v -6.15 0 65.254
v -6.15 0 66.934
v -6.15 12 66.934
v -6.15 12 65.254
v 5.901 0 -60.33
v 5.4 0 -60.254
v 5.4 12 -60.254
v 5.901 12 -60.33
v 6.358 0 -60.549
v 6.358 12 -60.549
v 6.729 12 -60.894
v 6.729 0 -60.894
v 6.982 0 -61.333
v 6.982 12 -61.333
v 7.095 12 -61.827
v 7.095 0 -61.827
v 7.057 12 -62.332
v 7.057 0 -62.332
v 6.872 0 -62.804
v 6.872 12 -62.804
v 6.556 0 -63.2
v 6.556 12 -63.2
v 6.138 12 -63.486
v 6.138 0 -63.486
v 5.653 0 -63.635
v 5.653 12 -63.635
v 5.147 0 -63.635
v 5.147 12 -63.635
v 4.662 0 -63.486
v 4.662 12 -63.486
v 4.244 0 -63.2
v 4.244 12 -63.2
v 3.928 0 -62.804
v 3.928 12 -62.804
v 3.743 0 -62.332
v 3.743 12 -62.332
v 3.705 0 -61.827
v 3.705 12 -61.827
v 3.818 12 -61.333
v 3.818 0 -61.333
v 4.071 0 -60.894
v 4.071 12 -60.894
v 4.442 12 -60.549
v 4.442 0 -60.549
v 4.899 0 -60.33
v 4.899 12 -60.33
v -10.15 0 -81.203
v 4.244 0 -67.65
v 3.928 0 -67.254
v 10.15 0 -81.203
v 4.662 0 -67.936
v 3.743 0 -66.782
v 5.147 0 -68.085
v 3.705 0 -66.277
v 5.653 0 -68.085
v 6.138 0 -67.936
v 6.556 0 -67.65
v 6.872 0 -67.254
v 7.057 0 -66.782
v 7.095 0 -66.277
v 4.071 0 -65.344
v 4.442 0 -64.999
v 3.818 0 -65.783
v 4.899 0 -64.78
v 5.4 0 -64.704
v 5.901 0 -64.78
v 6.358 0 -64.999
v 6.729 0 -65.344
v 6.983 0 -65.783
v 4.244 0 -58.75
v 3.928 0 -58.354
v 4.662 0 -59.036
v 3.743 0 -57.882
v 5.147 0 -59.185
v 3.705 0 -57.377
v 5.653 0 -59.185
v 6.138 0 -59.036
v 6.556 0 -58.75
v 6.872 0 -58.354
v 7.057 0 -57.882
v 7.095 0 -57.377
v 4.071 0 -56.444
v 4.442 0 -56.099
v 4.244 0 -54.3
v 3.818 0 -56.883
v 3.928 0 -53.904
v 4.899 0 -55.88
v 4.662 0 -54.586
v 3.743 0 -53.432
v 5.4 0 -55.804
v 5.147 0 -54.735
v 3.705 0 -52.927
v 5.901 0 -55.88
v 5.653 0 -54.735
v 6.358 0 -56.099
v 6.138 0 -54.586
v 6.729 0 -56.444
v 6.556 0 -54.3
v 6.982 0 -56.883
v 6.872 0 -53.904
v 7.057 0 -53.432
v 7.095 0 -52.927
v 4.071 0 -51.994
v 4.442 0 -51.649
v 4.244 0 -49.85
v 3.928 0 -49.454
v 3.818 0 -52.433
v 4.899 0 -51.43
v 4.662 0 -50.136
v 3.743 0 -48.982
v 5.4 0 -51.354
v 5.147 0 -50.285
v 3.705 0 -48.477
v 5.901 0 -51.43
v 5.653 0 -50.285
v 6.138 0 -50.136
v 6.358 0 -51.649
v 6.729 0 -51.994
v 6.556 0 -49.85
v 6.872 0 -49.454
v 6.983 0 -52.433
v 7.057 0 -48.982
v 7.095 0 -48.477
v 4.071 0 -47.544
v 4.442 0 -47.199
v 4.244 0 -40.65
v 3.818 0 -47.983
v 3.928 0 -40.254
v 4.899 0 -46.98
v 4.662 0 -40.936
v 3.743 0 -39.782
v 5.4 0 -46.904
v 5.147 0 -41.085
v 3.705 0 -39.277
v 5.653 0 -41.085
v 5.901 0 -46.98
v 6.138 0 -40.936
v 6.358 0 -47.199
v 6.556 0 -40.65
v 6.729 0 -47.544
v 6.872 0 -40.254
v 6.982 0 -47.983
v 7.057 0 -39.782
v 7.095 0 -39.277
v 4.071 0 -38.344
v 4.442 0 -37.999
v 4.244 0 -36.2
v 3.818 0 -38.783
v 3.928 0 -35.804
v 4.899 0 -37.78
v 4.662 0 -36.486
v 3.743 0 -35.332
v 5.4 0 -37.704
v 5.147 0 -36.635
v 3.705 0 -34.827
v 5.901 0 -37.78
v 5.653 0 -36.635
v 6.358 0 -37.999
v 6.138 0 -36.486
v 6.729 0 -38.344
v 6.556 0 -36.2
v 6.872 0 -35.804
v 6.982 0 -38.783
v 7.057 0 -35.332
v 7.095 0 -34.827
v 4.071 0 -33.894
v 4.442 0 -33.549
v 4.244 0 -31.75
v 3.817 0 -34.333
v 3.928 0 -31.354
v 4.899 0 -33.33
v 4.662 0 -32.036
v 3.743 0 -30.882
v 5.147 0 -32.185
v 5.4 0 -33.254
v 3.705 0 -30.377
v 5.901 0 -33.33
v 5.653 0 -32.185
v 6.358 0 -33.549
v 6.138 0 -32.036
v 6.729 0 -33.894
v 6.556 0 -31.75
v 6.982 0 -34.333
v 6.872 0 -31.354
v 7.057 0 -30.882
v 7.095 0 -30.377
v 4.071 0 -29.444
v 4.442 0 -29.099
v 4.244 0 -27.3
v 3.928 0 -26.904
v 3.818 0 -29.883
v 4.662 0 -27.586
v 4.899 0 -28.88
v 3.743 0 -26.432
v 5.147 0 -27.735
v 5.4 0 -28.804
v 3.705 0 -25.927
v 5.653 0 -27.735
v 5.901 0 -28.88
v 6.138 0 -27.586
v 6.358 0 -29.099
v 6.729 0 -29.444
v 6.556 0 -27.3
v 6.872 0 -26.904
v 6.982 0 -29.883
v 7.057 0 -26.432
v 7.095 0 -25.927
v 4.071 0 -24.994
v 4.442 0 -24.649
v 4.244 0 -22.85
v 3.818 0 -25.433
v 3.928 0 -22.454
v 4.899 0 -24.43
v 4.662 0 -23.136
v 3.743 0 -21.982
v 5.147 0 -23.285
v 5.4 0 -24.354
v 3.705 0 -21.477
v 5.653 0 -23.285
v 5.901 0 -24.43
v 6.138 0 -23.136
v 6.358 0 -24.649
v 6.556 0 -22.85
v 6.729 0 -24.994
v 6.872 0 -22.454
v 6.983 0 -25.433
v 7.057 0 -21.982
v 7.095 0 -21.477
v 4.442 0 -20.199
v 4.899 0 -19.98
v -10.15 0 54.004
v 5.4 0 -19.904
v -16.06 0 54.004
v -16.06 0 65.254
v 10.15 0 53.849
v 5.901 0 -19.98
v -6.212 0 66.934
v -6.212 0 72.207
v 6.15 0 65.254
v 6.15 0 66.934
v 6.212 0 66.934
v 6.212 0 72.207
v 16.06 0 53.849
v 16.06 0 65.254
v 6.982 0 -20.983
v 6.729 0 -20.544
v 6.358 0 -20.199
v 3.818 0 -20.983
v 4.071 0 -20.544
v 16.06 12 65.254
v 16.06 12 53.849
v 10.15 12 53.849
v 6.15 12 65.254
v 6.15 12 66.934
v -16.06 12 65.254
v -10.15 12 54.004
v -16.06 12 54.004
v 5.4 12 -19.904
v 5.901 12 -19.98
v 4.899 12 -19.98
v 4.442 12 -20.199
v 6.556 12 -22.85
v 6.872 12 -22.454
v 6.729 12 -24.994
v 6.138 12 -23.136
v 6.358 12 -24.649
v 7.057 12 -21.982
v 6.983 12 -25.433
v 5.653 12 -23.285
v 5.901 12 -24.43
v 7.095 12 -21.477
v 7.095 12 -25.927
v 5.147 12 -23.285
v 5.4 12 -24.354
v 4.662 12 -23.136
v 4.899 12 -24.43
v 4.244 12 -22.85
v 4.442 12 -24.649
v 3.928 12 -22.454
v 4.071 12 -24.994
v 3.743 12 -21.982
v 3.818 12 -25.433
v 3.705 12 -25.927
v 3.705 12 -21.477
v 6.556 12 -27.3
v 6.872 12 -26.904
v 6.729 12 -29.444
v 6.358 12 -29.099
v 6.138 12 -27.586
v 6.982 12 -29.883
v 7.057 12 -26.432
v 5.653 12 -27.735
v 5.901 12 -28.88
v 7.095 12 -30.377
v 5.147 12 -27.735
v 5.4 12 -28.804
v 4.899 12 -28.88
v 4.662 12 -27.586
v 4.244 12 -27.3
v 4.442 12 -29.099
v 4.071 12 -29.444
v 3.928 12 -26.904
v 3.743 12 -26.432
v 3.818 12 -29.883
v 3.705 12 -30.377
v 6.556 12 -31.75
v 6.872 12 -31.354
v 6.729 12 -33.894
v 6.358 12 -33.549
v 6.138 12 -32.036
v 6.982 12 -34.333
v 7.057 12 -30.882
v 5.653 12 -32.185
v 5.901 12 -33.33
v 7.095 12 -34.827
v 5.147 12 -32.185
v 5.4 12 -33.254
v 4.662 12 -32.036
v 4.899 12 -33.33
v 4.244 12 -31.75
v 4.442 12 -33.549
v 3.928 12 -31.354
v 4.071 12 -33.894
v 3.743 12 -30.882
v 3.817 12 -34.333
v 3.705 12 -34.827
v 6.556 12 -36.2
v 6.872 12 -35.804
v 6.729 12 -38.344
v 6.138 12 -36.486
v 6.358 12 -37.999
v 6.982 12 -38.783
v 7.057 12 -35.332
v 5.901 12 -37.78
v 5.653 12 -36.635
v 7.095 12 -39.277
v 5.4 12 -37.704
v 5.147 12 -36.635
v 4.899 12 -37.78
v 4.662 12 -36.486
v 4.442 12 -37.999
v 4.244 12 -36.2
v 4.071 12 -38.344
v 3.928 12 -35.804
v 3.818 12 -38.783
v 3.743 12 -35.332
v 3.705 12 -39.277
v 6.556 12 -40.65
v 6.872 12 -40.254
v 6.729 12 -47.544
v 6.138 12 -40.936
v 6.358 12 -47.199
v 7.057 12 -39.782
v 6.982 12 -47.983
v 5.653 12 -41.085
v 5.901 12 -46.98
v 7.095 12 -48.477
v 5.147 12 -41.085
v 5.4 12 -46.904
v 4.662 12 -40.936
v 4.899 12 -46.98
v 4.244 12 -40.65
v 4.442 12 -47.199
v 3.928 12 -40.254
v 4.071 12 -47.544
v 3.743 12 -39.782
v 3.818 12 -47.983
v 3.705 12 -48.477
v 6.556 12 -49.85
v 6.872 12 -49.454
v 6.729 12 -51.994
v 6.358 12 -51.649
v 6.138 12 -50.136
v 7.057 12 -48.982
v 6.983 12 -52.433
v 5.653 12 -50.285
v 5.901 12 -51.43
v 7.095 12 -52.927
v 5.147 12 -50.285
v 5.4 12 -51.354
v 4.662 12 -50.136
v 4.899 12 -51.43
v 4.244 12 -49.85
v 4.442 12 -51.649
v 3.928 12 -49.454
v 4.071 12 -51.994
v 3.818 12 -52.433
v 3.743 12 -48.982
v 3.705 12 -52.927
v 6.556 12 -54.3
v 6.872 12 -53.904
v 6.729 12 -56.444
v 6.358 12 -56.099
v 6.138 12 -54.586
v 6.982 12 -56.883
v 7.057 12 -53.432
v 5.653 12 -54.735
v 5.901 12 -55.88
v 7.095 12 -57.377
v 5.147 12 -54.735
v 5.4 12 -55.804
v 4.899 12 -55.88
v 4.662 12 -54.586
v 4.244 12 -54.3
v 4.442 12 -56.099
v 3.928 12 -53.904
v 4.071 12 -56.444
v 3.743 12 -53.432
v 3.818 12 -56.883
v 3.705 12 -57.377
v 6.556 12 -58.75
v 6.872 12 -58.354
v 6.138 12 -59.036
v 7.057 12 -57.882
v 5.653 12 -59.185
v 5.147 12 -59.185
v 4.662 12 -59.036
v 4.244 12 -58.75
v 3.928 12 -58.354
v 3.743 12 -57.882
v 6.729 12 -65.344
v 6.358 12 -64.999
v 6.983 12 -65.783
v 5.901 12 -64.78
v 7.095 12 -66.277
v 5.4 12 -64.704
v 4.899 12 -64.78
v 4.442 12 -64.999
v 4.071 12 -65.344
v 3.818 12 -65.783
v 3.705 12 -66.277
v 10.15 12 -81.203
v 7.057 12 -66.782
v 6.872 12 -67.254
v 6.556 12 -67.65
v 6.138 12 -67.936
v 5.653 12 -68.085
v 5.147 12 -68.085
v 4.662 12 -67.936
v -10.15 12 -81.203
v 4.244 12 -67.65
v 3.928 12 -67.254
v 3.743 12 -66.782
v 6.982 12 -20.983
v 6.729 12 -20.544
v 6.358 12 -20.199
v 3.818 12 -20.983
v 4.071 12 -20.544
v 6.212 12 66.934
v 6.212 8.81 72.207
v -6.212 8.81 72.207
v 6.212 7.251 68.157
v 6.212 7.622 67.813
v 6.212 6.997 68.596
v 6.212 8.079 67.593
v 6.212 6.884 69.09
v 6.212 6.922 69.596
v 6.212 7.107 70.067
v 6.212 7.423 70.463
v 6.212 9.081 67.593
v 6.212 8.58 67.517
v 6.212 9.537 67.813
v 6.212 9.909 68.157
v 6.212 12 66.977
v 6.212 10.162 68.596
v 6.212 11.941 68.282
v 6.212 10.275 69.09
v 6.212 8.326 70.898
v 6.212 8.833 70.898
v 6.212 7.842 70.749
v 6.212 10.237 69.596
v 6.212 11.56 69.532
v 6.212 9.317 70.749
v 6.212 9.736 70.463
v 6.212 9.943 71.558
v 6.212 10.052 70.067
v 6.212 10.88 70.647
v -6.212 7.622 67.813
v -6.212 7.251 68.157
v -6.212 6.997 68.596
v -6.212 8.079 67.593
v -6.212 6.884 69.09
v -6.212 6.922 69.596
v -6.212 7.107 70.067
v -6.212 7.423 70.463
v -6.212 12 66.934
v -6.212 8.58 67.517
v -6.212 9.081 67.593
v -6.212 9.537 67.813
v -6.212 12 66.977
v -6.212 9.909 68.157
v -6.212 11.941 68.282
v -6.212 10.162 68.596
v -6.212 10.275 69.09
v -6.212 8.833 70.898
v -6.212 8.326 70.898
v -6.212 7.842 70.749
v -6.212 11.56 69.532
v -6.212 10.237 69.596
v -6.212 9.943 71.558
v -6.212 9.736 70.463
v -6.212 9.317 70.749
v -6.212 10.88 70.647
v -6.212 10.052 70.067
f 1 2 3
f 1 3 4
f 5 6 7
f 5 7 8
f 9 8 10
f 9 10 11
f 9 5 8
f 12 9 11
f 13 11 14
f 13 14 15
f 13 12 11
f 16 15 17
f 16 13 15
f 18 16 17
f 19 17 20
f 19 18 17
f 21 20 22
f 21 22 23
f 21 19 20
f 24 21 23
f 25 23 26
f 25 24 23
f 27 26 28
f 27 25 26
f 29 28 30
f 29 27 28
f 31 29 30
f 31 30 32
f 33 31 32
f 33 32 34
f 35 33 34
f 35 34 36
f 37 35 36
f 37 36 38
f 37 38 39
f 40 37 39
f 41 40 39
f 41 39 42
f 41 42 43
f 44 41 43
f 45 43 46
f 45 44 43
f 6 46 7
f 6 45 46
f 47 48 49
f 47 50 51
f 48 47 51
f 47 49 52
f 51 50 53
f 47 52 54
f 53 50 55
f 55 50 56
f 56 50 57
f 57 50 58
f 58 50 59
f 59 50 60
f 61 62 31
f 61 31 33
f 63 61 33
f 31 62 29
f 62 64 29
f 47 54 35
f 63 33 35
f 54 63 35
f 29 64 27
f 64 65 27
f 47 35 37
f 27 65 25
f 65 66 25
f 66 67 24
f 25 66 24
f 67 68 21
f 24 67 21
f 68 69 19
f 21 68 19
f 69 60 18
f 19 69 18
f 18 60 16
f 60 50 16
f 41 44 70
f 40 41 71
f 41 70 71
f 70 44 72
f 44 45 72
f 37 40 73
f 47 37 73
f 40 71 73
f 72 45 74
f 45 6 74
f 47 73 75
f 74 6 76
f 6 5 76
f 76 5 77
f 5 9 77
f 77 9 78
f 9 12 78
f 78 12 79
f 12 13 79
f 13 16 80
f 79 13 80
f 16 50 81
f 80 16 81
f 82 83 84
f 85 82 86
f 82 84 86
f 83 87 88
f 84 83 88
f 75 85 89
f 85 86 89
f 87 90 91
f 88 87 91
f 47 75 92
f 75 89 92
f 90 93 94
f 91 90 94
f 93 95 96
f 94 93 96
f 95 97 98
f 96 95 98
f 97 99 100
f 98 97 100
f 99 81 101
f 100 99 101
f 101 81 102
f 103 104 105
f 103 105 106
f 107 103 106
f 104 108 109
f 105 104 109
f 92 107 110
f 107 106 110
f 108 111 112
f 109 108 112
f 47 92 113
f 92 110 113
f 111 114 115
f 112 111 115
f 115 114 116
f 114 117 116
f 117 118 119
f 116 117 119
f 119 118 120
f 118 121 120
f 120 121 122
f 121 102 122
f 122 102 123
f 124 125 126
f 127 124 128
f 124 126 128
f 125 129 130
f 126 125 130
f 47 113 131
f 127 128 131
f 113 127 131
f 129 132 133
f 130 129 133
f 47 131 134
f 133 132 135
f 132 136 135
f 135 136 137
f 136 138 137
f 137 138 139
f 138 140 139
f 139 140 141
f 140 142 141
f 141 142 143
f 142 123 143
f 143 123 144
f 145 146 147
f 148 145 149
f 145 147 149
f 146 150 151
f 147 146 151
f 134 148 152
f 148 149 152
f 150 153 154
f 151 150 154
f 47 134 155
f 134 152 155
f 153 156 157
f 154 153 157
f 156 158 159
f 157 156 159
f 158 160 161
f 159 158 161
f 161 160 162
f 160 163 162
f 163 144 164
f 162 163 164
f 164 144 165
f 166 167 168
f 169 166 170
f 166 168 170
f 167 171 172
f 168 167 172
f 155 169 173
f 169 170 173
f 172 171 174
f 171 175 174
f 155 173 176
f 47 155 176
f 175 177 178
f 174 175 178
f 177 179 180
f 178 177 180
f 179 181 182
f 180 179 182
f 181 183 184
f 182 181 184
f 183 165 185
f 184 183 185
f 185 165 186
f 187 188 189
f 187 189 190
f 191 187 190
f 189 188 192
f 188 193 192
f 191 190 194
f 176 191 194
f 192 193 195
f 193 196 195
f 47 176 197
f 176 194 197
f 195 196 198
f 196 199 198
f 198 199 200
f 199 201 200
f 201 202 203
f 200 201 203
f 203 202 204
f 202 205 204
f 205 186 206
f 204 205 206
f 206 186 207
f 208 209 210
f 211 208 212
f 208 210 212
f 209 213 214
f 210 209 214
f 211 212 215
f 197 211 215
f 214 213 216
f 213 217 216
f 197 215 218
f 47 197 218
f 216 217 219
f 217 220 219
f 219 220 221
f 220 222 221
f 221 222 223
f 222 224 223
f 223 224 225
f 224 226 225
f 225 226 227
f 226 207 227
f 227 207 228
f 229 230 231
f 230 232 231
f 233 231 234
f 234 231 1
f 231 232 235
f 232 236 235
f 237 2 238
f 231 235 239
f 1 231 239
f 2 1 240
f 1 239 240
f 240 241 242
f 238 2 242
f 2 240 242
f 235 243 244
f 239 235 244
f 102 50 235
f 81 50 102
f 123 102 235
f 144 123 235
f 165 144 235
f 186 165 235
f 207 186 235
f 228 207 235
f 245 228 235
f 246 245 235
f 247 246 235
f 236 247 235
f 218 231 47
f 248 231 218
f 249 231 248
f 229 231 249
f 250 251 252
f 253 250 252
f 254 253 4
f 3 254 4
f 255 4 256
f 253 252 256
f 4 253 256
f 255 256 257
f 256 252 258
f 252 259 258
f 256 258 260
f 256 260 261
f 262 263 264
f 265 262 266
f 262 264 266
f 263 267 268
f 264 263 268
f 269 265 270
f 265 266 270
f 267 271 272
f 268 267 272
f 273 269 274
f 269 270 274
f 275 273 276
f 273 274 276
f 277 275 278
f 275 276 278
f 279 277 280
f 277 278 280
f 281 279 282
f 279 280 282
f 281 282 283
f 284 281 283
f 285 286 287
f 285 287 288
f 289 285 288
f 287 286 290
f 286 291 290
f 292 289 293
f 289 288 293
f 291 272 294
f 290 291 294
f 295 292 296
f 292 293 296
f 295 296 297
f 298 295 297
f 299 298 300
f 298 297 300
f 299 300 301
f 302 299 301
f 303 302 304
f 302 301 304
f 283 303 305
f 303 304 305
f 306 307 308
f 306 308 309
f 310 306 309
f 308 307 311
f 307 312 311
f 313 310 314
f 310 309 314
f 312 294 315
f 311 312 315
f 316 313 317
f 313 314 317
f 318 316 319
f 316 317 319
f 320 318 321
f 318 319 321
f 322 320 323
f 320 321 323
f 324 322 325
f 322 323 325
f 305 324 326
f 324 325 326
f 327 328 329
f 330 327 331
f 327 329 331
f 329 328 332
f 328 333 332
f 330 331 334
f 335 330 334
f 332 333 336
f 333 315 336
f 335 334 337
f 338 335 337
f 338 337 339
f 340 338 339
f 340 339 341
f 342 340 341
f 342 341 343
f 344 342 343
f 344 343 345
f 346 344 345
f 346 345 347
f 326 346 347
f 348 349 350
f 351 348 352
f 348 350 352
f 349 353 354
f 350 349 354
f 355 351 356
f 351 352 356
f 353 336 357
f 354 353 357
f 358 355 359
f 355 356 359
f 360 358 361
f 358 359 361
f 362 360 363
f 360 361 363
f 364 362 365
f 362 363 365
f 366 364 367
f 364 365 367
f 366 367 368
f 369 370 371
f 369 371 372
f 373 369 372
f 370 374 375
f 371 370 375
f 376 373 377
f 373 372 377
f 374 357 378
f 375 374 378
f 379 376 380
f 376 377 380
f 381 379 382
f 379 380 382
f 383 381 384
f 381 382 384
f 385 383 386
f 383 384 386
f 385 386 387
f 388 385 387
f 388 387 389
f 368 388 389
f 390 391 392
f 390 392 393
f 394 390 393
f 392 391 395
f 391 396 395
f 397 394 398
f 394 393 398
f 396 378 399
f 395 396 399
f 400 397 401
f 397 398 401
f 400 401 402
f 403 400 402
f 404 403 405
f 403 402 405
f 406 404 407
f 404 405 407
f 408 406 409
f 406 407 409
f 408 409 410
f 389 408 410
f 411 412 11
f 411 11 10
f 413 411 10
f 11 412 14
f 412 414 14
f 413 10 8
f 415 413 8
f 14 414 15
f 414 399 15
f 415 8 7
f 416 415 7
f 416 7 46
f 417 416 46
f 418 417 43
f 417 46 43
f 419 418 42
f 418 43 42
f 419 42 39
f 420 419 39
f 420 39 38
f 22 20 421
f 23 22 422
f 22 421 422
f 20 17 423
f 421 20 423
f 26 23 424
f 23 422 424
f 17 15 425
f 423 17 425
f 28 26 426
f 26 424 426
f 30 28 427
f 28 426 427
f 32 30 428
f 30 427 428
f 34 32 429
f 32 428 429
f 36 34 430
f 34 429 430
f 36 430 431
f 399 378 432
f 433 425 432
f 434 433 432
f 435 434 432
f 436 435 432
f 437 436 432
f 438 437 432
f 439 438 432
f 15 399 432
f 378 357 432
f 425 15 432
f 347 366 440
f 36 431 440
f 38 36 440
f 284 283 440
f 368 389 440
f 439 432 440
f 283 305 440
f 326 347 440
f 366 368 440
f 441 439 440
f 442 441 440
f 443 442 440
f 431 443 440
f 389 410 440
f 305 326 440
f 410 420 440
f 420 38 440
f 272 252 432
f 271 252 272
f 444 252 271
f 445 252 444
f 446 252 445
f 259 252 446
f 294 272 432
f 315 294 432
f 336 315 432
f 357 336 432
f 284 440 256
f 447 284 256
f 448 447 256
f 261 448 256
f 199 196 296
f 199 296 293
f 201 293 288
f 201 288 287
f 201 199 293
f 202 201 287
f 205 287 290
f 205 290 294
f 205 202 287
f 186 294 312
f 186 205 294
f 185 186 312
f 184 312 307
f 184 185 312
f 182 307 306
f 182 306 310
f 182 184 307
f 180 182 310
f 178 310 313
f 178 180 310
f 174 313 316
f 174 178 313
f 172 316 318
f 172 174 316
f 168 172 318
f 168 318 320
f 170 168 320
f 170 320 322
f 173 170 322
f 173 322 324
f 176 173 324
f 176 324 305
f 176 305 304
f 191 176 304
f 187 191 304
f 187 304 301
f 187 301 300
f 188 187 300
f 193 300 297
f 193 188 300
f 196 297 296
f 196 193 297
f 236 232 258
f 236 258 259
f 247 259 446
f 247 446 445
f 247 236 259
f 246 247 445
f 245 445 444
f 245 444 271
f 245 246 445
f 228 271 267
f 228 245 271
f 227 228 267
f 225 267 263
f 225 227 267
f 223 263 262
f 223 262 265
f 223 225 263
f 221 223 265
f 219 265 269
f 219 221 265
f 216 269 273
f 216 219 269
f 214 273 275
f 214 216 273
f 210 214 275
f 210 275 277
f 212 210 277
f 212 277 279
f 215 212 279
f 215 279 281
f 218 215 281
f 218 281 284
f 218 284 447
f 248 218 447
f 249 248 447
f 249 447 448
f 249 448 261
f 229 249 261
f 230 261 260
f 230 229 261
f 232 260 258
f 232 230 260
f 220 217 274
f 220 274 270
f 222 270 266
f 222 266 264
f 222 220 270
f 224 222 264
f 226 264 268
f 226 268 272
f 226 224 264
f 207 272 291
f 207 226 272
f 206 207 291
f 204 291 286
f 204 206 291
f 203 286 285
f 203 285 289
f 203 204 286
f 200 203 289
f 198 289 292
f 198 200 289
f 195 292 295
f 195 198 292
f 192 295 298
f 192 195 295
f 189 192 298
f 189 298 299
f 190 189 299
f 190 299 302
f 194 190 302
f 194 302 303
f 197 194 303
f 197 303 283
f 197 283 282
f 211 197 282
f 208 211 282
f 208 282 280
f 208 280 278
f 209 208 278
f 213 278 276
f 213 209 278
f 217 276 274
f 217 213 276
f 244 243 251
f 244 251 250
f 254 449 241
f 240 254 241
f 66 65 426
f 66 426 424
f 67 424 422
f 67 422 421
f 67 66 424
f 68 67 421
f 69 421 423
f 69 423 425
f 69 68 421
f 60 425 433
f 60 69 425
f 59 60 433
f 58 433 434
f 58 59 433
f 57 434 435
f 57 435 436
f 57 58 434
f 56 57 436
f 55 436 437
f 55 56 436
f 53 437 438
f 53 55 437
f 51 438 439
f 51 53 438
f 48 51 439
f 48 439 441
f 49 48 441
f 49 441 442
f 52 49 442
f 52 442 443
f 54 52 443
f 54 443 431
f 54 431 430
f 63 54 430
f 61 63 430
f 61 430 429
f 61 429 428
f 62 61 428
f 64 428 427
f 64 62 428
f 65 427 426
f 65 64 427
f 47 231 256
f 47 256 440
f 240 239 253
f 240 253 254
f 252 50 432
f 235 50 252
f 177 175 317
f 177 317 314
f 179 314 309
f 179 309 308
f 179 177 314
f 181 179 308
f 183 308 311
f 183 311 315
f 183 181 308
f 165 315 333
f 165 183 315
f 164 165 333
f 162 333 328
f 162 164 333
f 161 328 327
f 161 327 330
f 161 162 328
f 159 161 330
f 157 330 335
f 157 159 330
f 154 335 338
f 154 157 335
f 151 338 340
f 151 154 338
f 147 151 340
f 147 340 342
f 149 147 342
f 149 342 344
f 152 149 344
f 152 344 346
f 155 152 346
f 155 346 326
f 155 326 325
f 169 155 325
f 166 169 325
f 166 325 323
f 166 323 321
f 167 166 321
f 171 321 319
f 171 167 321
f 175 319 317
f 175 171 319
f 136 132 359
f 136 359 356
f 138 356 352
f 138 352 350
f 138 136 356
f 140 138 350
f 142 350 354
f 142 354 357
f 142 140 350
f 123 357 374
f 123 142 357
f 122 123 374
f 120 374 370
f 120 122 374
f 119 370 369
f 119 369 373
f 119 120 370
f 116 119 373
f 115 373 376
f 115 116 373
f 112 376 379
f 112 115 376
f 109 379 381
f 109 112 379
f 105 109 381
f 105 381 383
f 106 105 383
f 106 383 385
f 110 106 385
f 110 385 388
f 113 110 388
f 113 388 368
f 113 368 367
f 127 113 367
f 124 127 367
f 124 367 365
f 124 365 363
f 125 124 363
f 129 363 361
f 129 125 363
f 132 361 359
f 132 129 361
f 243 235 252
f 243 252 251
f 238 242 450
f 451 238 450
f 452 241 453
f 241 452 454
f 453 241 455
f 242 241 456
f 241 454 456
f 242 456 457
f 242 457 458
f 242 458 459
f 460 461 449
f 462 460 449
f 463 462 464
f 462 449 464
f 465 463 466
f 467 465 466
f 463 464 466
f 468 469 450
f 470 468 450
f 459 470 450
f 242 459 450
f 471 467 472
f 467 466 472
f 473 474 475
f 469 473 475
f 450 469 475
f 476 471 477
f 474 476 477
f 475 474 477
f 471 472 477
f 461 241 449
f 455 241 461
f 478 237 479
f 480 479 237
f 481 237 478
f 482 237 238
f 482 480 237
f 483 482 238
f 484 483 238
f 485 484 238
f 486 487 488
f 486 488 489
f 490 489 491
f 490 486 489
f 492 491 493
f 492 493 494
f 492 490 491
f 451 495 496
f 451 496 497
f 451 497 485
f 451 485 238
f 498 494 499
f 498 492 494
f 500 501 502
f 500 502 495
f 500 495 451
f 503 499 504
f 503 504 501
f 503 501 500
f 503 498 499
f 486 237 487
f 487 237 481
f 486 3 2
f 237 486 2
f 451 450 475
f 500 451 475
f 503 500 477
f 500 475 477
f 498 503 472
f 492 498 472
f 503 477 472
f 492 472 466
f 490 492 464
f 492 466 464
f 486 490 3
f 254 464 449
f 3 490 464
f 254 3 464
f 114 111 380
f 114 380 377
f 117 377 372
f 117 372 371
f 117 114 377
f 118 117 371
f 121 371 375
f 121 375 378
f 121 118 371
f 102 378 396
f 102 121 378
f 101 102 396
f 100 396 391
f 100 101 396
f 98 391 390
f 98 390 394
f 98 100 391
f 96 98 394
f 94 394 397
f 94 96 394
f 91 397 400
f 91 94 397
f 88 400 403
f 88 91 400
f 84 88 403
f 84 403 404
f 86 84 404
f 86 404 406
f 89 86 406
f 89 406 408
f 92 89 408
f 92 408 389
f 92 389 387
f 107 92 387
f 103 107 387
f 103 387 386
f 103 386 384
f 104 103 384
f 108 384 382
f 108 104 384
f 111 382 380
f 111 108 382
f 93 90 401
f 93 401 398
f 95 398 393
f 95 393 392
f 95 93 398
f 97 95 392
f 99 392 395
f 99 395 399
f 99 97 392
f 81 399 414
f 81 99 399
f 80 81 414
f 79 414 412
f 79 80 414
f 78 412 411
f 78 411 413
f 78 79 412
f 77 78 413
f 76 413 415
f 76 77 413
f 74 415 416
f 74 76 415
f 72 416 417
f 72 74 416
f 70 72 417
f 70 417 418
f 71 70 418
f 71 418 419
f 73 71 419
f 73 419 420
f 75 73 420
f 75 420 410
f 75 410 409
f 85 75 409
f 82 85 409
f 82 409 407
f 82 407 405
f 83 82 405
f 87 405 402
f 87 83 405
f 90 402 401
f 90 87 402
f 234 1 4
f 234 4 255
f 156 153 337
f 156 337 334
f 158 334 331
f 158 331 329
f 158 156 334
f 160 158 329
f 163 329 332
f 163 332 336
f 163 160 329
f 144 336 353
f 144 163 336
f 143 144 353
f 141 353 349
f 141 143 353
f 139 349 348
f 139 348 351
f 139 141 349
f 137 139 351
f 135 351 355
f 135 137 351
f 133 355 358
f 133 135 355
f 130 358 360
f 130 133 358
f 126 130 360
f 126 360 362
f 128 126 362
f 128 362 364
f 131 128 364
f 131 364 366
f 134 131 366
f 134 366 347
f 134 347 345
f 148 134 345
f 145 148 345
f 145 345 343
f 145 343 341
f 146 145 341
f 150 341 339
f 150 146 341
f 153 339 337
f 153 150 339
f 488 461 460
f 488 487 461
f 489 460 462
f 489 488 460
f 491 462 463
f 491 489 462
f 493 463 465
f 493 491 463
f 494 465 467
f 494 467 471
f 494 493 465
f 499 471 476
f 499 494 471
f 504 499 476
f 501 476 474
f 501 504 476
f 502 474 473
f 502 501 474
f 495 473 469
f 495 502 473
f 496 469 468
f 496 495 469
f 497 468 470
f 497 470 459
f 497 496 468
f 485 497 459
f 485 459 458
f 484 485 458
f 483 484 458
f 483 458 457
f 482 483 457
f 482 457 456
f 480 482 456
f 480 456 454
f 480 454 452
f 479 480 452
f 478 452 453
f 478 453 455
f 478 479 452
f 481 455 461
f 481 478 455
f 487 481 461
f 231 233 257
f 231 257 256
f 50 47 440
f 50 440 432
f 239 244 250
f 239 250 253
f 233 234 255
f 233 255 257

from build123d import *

# Parameters (mm, degrees)
SKETCH1_R           = 1.7
BOSS_EXTRUDE1_DEPTH = 12
SKETCH2_R           = 1.7
BOSS_EXTRUDE2_DEPTH = 6.2125


with BuildPart() as part:
    # Sketch1 → Boss-Extrude1 (new body)
    with BuildSketch(Plane(origin=(0, 0, 0), x_dir=(1, 0, 0), z_dir=(0, 1, 0))):
        Polygon((-10.15, 81.202952909), (10.15, 81.202952909), (10.15, -53.848636554), (16.06, -53.848636554), (16.06, -65.254427144), (6.15, -65.254427144), (6.15, -66.934427144), (-6.15, -66.934427144), (-6.15, -65.254427144), (-16.06, -65.254427144), (-16.06, -54.004427144), (-10.15, -54.004427144), align=None)
        with Locations(Location((5.4, 57.504034689, 0), (0, 0, 270))):
            Circle(SKETCH1_R, mode=Mode.SUBTRACT)
        with Locations(Location((5.4, 30.504034689, 0), (0, 0, 270))):
            Circle(SKETCH1_R, mode=Mode.SUBTRACT)
        with Locations(Location((5.4001, 53.054034689, 0), (0, 0, 270))):
            Circle(SKETCH1_R, mode=Mode.SUBTRACT)
        with Locations(Location((5.4001, 26.054034689, 0), (0, 0, 270))):
            Circle(SKETCH1_R, mode=Mode.SUBTRACT)
        with Locations(Location((5.4, 61.954034689, 0), (0, 0, 270))):
            Circle(SKETCH1_R, mode=Mode.SUBTRACT)
        with Locations(Location((5.39995, 34.954034689, 0), (0, 0, 270))):
            Circle(SKETCH1_R, mode=Mode.SUBTRACT)
        with Locations(Location((5.4, 48.60403469, 0), (0, 0, 270))):
            Circle(SKETCH1_R, mode=Mode.SUBTRACT)
        with Locations(Location((5.40005, 66.404034689, 0), (0, 0, 270))):
            Circle(SKETCH1_R, mode=Mode.SUBTRACT)
        with Locations(Location((5.4, 21.60403469, 0), (0, 0, 270))):
            Circle(SKETCH1_R, mode=Mode.SUBTRACT)
        with Locations(Location((5.4, 39.404034689, 0), (0, 0, 270))):
            Circle(SKETCH1_R, mode=Mode.SUBTRACT)
    extrude(amount=BOSS_EXTRUDE1_DEPTH)

    # Sketch2 → Boss-Extrude2 (add, symmetric)
    with BuildSketch(Plane(origin=(0, 0, 0), x_dir=(0, 0, -1), z_dir=(1, 0, 0))):
        with BuildLine():
            Line((-72.207292933, 5.999665069), (-72.207292933, 8.809665069))
            ThreePointArc((-72.207292933, 8.809665069), (-70.110812417, 11.254776949), (-66.977292933, 11.999665069))
            Line((-66.977292933, 11.999665069), (-66.934427144, 12))
            Line((-66.934427144, 12), (-66.934427144, 0))
            Line((-66.934427144, 0), (-72.207292933, 0))
            Line((-72.207292933, 0), (-72.207292933, 5.999665069))
        make_face()
        with Locations((-69.217292933, 8.579665069)):
            Circle(SKETCH2_R, mode=Mode.SUBTRACT)
    extrude(amount=BOSS_EXTRUDE2_DEPTH, both=True)


solid = part.part
